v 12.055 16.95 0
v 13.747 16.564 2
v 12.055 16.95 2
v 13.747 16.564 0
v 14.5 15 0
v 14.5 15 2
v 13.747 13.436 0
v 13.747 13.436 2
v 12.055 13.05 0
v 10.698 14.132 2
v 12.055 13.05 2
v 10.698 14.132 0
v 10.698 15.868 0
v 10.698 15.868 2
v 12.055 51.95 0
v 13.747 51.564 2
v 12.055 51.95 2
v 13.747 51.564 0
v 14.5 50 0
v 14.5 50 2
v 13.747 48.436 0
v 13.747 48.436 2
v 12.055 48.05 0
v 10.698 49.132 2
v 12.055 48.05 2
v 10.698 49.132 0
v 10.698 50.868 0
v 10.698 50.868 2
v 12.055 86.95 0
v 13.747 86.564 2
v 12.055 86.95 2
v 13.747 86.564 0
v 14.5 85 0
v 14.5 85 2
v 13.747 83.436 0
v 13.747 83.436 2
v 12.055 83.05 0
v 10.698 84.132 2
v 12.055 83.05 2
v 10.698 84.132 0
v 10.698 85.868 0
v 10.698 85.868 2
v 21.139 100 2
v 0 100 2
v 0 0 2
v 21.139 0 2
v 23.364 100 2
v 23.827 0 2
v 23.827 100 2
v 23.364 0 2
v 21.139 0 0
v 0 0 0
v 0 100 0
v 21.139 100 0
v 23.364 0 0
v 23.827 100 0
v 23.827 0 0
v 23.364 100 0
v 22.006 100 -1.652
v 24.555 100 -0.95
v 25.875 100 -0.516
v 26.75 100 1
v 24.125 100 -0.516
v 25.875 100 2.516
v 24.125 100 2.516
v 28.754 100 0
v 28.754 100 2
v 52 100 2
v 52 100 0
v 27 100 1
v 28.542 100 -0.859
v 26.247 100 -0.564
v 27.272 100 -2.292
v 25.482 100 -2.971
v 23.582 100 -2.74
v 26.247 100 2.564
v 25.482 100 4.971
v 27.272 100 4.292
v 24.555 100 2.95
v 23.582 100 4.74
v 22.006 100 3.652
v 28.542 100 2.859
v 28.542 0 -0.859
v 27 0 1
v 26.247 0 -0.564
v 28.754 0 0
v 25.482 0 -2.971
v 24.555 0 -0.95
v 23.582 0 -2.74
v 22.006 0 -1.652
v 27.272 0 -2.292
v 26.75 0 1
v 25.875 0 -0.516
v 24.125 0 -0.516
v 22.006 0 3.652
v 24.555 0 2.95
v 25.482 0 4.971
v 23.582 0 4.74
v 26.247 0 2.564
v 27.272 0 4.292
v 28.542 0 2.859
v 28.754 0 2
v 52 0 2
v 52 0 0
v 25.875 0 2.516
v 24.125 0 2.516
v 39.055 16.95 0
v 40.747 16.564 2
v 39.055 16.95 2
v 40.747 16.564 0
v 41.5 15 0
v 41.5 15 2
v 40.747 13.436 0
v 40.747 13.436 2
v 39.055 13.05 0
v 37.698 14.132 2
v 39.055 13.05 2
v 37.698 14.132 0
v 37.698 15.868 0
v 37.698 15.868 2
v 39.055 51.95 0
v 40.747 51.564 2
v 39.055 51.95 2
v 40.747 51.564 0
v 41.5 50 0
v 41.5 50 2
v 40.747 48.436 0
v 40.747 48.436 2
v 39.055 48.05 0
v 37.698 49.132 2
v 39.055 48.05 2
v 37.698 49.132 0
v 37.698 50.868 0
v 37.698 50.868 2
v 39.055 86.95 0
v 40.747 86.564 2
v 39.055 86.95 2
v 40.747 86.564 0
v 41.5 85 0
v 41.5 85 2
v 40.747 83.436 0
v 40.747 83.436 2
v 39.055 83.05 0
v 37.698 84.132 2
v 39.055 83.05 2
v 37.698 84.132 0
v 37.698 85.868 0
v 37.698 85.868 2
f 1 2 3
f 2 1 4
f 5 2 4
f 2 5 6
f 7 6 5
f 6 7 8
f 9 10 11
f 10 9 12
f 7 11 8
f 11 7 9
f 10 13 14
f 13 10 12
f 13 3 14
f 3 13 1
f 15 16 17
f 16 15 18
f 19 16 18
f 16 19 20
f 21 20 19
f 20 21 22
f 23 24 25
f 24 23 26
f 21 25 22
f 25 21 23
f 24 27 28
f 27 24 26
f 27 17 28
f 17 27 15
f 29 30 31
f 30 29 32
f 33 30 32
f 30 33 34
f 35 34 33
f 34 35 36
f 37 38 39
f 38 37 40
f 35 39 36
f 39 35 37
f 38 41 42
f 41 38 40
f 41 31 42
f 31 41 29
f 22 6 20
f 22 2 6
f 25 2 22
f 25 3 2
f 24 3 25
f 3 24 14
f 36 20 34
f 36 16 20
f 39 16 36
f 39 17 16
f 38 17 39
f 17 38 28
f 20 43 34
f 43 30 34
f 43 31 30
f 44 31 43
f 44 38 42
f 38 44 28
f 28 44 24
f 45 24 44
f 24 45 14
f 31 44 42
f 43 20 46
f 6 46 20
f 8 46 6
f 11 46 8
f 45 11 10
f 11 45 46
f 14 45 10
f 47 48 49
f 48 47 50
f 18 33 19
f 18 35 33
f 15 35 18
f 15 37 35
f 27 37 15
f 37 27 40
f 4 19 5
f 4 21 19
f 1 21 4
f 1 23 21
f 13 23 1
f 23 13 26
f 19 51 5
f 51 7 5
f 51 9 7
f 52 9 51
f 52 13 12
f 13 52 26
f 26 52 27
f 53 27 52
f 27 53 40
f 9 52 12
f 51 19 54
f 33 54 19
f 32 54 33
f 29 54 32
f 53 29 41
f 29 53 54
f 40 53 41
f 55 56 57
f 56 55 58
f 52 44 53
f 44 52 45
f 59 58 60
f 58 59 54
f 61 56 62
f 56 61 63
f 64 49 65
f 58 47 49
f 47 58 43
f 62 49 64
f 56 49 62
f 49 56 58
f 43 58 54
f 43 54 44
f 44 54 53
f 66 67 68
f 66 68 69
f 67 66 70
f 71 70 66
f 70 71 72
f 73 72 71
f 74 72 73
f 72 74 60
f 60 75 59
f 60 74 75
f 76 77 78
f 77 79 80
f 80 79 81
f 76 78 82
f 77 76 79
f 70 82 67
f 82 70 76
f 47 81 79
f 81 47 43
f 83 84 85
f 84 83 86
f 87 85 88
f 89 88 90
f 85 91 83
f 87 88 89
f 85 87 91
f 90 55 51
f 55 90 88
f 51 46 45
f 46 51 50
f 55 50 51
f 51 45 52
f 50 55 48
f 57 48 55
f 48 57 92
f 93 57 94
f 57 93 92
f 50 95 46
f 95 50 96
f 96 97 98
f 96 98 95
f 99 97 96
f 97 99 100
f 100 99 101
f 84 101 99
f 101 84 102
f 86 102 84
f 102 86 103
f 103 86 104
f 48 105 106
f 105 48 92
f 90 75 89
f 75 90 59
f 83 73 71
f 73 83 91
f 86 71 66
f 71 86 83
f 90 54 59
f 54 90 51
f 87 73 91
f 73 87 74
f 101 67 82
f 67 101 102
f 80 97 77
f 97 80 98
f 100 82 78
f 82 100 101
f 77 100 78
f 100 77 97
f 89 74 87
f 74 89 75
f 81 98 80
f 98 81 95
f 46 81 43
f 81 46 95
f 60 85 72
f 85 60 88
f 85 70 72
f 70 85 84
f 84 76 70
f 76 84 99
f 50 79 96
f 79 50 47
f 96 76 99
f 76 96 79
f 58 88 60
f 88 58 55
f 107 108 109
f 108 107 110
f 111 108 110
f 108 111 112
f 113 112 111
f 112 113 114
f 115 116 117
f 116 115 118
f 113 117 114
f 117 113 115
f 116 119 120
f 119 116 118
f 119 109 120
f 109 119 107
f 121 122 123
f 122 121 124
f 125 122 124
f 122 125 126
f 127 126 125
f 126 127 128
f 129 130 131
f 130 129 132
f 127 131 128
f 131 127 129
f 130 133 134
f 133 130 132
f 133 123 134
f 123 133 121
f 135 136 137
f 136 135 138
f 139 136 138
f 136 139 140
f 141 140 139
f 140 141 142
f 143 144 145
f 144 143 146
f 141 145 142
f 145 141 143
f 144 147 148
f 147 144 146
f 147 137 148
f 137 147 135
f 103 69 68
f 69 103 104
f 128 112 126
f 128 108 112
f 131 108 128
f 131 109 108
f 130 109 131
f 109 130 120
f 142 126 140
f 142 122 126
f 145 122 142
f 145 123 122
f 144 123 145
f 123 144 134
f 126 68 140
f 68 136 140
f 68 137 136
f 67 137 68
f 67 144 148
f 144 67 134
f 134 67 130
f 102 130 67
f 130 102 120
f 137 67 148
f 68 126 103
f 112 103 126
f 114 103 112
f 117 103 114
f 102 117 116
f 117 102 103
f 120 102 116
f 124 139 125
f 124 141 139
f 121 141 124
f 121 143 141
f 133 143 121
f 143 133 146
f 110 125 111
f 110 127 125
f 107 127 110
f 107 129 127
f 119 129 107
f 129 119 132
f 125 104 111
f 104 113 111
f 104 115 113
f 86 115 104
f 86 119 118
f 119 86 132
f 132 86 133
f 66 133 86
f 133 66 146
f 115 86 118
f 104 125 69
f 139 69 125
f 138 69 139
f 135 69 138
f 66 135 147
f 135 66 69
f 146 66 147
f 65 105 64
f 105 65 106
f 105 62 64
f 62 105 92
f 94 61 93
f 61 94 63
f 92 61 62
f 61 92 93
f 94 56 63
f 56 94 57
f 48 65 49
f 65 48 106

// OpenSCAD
// file: ../libs/utils.scad
// SketchCaddy - 通用工具函数库

use <global_params.scad>

// ============================================
// 1010铝型材截面模块
// ============================================
module extrusion_profile_1010(size = 10) {
    wall = 1.2;
    slot_width = 4;
    slot_depth = 2.5;
    
    difference() {
        // 外轮廓
        square(size, center = true);
        
        // 中心孔
        circle(d = size - 2 * wall);
        
        // 四个T槽
        for (angle = [0, 90, 180, 270]) {
            rotate([0, 0, angle])
            translate([0, size/2 - slot_depth/2])
            square([slot_width, slot_depth + 0.1], center = true);
        }
    }
}

// ============================================
// 铝型材拉伸模块
// ============================================
module extrusion_1010(length, size = 10) {
    color(color_frame)
    rotate([90, 0, 0])
    linear_extrude(height = length, center = false)
    extrusion_profile_1010(size);
}

// 沿X轴的型材
module extrusion_x(length, size = 10) {
    rotate([0, 90, 0])
    rotate([0, 0, 90])
    extrusion_1010(length, size);
}

// 沿Y轴的型材
module extrusion_y(length, size = 10) {
    rotate([0, 0, 0])
    extrusion_1010(length, size);
}

// 沿Z轴的型材
module extrusion_z(length, size = 10) {
    rotate([-90, 0, 0])
    extrusion_1010(length, size);
}

// ============================================
// 圆角矩形
// ============================================
module rounded_rect(size, radius, height) {
    linear_extrude(height = height)
    offset(r = radius)
    offset(r = -radius)
    square([size.x, size.y], center = true);
}

// ============================================
// 带圆角的面板
// ============================================
module panel(width, height, thickness, corner_radius = 3) {
    color(color_panel)
    translate([0, 0, thickness/2])
    rounded_rect([width, height], corner_radius, thickness);
}

// ============================================
// 螺丝孔
// ============================================
module screw_hole(diameter, depth, countersink = false) {
    union() {
        cylinder(d = diameter, h = depth + 0.1);
        if (countersink) {
            translate([0, 0, depth - diameter/2])
            cylinder(d1 = diameter, d2 = diameter * 2, h = diameter/2);
        }
    }
}

// ============================================
// 爆炸视图辅助
// ============================================
module explode(direction, distance, explode_factor = 0) {
    translate(direction * distance * explode_factor)
    children();
}
// file: ../libs/global_params.scad
// SketchCaddy - 全局参数定义
// 所有单位：毫米 (mm)

// ============================================
// 核心箱体尺寸
// ============================================
global_box_length = 520;   // 长 (X轴)
global_box_width = 520;    // 宽 (Y轴)
global_box_height = 750;   // 高 (Z轴)

// ============================================
// 面板厚度
// ============================================
panel_thickness = 5; // PP蜂窝板或航空板厚度

// ============================================
// 铝型材规格 (1010系列)
// ============================================
extrusion_size = 10;           // 10mm x 10mm 轻型铝型材
extrusion_slot_width = 8;      // 型材T型槽宽度
extrusion_wall_thickness = 1.2; // 型材壁厚
extrusion_inner_size = extrusion_size - 2 * extrusion_wall_thickness;

// ============================================
// 画架参数
// ============================================
easel_bag_length = 750;        // 画架袋长度
easel_bag_diameter = 100;      // 画架袋直径
easel_height_max = 1500;       // 画架最大展开高度

// ============================================
// 轮子参数
// ============================================
wheel_diameter = 203.2;        // 8英寸 = 203.2mm
wheel_width = 50;              // 轮宽

// ============================================
// 公差与配合
// ============================================
tolerance = 1;                 // 面板与框架配合间隙
$fn = 32;                      // 圆形分辨率

// ============================================
// 颜色定义
// ============================================
color_frame = [0.7, 0.7, 0.7];      // 铝型材银灰色
color_panel = [0.2, 0.2, 0.2];      // 面板深灰色
color_accent = [0.9, 0.5, 0.1];     // 强调色橙色
color_wheel = [0.1, 0.1, 0.1];      // 轮子黑色
color_handle = [0.3, 0.3, 0.35];    // 拉杆深灰

// ============================================
// 辅助函数
// ============================================

// 计算框架内部可用空间
function inner_length() = global_box_length - 2 * extrusion_size - 2 * panel_thickness;
function inner_width() = global_box_width - 2 * extrusion_size - 2 * panel_thickness;
function inner_height() = global_box_height - 2 * extrusion_size - 2 * panel_thickness;
// main file
// ============================================
// F04_Panel_Connector_Hinge.scad
// 面板拼接铰链 - 用于三合一画板功能
// ============================================

use <../libs/global_params.scad>
use <../libs/utils.scad>

// 铰链参数
hinge_length = 100;          // 铰链长度
leaf_width = 25;             // 叶片宽度
leaf_thickness = 2;          // 叶片厚度
gap = 2;                     // 两板之间间隙

// 定位结构参数
pin_diameter = 6;
pin_length = 8;

// ============================================
// 铰链叶片
// ============================================
module F04_Hinge_Leaf() {
    color([0.75, 0.75, 0.75])
    difference() {
        cube([leaf_width, hinge_length, leaf_thickness]);
        
        // 安装孔
        for (y = [15, hinge_length/2, hinge_length - 15]) {
            translate([leaf_width/2, y, -0.1])
            cylinder(d = 4, h = leaf_thickness + 0.2);
        }
    }
}

// ============================================
// 连接轴套
// ============================================
module F04_Knuckle() {
    knuckle_outer = 8;
    knuckle_inner = 4;
    
    color([0.8, 0.8, 0.8])
    difference() {
        cylinder(d = knuckle_outer, h = hinge_length/5);
        translate([0, 0, -0.1])
        cylinder(d = knuckle_inner, h = hinge_length/5 + 0.2);
    }
}

// ============================================
// 平面定位销
// ============================================
module F04_Alignment_Pin() {
    color(color_frame)
    union() {
        // 销体
        cylinder(d = pin_diameter, h = pin_length);
        // 头部
        translate([0, 0, pin_length])
        cylinder(d = pin_diameter + 2, h = 2);
    }
}

// ============================================
// 完整拼接铰链
// ============================================
module F04_Panel_Connector_Hinge(angle = 0) {
    // 左侧叶片
    F04_Hinge_Leaf();
    
    // 轴套（交替排列）
    for (i = [0:4]) {
        translate([leaf_width, i * hinge_length/5, leaf_thickness/2])
        rotate([-90, 0, 0])
        F04_Knuckle();
    }
    
    // 右侧叶片（可旋转）
    translate([leaf_width + gap, 0, 0])
    rotate([0, -angle, 0])
    translate([0, 0, 0])
    F04_Hinge_Leaf();
    
    // 连接轴
    color([0.6, 0.6, 0.6])
    translate([leaf_width, 0, leaf_thickness/2])
    rotate([-90, 0, 0])
    cylinder(d = 3.5, h = hinge_length);
}

// ============================================
// 带定位功能的铰链组件
// ============================================
module F04_Panel_Connector_With_Alignment(angle = 0) {
    // 主铰链
    F04_Panel_Connector_Hinge(angle);
    
    // 定位销（确保180度时平面对齐）
    if (angle == 0 || angle == 180) {
        translate([leaf_width/2, hinge_length + 10, leaf_thickness])
        F04_Alignment_Pin();
        
        translate([leaf_width + gap + leaf_width/2, hinge_length + 10, leaf_thickness])
        rotate([180, 0, 0])
        translate([0, 0, -pin_length - 2])
        F04_Alignment_Pin();
    }
}

// 预览
F04_Panel_Connector_Hinge(angle = 0);
